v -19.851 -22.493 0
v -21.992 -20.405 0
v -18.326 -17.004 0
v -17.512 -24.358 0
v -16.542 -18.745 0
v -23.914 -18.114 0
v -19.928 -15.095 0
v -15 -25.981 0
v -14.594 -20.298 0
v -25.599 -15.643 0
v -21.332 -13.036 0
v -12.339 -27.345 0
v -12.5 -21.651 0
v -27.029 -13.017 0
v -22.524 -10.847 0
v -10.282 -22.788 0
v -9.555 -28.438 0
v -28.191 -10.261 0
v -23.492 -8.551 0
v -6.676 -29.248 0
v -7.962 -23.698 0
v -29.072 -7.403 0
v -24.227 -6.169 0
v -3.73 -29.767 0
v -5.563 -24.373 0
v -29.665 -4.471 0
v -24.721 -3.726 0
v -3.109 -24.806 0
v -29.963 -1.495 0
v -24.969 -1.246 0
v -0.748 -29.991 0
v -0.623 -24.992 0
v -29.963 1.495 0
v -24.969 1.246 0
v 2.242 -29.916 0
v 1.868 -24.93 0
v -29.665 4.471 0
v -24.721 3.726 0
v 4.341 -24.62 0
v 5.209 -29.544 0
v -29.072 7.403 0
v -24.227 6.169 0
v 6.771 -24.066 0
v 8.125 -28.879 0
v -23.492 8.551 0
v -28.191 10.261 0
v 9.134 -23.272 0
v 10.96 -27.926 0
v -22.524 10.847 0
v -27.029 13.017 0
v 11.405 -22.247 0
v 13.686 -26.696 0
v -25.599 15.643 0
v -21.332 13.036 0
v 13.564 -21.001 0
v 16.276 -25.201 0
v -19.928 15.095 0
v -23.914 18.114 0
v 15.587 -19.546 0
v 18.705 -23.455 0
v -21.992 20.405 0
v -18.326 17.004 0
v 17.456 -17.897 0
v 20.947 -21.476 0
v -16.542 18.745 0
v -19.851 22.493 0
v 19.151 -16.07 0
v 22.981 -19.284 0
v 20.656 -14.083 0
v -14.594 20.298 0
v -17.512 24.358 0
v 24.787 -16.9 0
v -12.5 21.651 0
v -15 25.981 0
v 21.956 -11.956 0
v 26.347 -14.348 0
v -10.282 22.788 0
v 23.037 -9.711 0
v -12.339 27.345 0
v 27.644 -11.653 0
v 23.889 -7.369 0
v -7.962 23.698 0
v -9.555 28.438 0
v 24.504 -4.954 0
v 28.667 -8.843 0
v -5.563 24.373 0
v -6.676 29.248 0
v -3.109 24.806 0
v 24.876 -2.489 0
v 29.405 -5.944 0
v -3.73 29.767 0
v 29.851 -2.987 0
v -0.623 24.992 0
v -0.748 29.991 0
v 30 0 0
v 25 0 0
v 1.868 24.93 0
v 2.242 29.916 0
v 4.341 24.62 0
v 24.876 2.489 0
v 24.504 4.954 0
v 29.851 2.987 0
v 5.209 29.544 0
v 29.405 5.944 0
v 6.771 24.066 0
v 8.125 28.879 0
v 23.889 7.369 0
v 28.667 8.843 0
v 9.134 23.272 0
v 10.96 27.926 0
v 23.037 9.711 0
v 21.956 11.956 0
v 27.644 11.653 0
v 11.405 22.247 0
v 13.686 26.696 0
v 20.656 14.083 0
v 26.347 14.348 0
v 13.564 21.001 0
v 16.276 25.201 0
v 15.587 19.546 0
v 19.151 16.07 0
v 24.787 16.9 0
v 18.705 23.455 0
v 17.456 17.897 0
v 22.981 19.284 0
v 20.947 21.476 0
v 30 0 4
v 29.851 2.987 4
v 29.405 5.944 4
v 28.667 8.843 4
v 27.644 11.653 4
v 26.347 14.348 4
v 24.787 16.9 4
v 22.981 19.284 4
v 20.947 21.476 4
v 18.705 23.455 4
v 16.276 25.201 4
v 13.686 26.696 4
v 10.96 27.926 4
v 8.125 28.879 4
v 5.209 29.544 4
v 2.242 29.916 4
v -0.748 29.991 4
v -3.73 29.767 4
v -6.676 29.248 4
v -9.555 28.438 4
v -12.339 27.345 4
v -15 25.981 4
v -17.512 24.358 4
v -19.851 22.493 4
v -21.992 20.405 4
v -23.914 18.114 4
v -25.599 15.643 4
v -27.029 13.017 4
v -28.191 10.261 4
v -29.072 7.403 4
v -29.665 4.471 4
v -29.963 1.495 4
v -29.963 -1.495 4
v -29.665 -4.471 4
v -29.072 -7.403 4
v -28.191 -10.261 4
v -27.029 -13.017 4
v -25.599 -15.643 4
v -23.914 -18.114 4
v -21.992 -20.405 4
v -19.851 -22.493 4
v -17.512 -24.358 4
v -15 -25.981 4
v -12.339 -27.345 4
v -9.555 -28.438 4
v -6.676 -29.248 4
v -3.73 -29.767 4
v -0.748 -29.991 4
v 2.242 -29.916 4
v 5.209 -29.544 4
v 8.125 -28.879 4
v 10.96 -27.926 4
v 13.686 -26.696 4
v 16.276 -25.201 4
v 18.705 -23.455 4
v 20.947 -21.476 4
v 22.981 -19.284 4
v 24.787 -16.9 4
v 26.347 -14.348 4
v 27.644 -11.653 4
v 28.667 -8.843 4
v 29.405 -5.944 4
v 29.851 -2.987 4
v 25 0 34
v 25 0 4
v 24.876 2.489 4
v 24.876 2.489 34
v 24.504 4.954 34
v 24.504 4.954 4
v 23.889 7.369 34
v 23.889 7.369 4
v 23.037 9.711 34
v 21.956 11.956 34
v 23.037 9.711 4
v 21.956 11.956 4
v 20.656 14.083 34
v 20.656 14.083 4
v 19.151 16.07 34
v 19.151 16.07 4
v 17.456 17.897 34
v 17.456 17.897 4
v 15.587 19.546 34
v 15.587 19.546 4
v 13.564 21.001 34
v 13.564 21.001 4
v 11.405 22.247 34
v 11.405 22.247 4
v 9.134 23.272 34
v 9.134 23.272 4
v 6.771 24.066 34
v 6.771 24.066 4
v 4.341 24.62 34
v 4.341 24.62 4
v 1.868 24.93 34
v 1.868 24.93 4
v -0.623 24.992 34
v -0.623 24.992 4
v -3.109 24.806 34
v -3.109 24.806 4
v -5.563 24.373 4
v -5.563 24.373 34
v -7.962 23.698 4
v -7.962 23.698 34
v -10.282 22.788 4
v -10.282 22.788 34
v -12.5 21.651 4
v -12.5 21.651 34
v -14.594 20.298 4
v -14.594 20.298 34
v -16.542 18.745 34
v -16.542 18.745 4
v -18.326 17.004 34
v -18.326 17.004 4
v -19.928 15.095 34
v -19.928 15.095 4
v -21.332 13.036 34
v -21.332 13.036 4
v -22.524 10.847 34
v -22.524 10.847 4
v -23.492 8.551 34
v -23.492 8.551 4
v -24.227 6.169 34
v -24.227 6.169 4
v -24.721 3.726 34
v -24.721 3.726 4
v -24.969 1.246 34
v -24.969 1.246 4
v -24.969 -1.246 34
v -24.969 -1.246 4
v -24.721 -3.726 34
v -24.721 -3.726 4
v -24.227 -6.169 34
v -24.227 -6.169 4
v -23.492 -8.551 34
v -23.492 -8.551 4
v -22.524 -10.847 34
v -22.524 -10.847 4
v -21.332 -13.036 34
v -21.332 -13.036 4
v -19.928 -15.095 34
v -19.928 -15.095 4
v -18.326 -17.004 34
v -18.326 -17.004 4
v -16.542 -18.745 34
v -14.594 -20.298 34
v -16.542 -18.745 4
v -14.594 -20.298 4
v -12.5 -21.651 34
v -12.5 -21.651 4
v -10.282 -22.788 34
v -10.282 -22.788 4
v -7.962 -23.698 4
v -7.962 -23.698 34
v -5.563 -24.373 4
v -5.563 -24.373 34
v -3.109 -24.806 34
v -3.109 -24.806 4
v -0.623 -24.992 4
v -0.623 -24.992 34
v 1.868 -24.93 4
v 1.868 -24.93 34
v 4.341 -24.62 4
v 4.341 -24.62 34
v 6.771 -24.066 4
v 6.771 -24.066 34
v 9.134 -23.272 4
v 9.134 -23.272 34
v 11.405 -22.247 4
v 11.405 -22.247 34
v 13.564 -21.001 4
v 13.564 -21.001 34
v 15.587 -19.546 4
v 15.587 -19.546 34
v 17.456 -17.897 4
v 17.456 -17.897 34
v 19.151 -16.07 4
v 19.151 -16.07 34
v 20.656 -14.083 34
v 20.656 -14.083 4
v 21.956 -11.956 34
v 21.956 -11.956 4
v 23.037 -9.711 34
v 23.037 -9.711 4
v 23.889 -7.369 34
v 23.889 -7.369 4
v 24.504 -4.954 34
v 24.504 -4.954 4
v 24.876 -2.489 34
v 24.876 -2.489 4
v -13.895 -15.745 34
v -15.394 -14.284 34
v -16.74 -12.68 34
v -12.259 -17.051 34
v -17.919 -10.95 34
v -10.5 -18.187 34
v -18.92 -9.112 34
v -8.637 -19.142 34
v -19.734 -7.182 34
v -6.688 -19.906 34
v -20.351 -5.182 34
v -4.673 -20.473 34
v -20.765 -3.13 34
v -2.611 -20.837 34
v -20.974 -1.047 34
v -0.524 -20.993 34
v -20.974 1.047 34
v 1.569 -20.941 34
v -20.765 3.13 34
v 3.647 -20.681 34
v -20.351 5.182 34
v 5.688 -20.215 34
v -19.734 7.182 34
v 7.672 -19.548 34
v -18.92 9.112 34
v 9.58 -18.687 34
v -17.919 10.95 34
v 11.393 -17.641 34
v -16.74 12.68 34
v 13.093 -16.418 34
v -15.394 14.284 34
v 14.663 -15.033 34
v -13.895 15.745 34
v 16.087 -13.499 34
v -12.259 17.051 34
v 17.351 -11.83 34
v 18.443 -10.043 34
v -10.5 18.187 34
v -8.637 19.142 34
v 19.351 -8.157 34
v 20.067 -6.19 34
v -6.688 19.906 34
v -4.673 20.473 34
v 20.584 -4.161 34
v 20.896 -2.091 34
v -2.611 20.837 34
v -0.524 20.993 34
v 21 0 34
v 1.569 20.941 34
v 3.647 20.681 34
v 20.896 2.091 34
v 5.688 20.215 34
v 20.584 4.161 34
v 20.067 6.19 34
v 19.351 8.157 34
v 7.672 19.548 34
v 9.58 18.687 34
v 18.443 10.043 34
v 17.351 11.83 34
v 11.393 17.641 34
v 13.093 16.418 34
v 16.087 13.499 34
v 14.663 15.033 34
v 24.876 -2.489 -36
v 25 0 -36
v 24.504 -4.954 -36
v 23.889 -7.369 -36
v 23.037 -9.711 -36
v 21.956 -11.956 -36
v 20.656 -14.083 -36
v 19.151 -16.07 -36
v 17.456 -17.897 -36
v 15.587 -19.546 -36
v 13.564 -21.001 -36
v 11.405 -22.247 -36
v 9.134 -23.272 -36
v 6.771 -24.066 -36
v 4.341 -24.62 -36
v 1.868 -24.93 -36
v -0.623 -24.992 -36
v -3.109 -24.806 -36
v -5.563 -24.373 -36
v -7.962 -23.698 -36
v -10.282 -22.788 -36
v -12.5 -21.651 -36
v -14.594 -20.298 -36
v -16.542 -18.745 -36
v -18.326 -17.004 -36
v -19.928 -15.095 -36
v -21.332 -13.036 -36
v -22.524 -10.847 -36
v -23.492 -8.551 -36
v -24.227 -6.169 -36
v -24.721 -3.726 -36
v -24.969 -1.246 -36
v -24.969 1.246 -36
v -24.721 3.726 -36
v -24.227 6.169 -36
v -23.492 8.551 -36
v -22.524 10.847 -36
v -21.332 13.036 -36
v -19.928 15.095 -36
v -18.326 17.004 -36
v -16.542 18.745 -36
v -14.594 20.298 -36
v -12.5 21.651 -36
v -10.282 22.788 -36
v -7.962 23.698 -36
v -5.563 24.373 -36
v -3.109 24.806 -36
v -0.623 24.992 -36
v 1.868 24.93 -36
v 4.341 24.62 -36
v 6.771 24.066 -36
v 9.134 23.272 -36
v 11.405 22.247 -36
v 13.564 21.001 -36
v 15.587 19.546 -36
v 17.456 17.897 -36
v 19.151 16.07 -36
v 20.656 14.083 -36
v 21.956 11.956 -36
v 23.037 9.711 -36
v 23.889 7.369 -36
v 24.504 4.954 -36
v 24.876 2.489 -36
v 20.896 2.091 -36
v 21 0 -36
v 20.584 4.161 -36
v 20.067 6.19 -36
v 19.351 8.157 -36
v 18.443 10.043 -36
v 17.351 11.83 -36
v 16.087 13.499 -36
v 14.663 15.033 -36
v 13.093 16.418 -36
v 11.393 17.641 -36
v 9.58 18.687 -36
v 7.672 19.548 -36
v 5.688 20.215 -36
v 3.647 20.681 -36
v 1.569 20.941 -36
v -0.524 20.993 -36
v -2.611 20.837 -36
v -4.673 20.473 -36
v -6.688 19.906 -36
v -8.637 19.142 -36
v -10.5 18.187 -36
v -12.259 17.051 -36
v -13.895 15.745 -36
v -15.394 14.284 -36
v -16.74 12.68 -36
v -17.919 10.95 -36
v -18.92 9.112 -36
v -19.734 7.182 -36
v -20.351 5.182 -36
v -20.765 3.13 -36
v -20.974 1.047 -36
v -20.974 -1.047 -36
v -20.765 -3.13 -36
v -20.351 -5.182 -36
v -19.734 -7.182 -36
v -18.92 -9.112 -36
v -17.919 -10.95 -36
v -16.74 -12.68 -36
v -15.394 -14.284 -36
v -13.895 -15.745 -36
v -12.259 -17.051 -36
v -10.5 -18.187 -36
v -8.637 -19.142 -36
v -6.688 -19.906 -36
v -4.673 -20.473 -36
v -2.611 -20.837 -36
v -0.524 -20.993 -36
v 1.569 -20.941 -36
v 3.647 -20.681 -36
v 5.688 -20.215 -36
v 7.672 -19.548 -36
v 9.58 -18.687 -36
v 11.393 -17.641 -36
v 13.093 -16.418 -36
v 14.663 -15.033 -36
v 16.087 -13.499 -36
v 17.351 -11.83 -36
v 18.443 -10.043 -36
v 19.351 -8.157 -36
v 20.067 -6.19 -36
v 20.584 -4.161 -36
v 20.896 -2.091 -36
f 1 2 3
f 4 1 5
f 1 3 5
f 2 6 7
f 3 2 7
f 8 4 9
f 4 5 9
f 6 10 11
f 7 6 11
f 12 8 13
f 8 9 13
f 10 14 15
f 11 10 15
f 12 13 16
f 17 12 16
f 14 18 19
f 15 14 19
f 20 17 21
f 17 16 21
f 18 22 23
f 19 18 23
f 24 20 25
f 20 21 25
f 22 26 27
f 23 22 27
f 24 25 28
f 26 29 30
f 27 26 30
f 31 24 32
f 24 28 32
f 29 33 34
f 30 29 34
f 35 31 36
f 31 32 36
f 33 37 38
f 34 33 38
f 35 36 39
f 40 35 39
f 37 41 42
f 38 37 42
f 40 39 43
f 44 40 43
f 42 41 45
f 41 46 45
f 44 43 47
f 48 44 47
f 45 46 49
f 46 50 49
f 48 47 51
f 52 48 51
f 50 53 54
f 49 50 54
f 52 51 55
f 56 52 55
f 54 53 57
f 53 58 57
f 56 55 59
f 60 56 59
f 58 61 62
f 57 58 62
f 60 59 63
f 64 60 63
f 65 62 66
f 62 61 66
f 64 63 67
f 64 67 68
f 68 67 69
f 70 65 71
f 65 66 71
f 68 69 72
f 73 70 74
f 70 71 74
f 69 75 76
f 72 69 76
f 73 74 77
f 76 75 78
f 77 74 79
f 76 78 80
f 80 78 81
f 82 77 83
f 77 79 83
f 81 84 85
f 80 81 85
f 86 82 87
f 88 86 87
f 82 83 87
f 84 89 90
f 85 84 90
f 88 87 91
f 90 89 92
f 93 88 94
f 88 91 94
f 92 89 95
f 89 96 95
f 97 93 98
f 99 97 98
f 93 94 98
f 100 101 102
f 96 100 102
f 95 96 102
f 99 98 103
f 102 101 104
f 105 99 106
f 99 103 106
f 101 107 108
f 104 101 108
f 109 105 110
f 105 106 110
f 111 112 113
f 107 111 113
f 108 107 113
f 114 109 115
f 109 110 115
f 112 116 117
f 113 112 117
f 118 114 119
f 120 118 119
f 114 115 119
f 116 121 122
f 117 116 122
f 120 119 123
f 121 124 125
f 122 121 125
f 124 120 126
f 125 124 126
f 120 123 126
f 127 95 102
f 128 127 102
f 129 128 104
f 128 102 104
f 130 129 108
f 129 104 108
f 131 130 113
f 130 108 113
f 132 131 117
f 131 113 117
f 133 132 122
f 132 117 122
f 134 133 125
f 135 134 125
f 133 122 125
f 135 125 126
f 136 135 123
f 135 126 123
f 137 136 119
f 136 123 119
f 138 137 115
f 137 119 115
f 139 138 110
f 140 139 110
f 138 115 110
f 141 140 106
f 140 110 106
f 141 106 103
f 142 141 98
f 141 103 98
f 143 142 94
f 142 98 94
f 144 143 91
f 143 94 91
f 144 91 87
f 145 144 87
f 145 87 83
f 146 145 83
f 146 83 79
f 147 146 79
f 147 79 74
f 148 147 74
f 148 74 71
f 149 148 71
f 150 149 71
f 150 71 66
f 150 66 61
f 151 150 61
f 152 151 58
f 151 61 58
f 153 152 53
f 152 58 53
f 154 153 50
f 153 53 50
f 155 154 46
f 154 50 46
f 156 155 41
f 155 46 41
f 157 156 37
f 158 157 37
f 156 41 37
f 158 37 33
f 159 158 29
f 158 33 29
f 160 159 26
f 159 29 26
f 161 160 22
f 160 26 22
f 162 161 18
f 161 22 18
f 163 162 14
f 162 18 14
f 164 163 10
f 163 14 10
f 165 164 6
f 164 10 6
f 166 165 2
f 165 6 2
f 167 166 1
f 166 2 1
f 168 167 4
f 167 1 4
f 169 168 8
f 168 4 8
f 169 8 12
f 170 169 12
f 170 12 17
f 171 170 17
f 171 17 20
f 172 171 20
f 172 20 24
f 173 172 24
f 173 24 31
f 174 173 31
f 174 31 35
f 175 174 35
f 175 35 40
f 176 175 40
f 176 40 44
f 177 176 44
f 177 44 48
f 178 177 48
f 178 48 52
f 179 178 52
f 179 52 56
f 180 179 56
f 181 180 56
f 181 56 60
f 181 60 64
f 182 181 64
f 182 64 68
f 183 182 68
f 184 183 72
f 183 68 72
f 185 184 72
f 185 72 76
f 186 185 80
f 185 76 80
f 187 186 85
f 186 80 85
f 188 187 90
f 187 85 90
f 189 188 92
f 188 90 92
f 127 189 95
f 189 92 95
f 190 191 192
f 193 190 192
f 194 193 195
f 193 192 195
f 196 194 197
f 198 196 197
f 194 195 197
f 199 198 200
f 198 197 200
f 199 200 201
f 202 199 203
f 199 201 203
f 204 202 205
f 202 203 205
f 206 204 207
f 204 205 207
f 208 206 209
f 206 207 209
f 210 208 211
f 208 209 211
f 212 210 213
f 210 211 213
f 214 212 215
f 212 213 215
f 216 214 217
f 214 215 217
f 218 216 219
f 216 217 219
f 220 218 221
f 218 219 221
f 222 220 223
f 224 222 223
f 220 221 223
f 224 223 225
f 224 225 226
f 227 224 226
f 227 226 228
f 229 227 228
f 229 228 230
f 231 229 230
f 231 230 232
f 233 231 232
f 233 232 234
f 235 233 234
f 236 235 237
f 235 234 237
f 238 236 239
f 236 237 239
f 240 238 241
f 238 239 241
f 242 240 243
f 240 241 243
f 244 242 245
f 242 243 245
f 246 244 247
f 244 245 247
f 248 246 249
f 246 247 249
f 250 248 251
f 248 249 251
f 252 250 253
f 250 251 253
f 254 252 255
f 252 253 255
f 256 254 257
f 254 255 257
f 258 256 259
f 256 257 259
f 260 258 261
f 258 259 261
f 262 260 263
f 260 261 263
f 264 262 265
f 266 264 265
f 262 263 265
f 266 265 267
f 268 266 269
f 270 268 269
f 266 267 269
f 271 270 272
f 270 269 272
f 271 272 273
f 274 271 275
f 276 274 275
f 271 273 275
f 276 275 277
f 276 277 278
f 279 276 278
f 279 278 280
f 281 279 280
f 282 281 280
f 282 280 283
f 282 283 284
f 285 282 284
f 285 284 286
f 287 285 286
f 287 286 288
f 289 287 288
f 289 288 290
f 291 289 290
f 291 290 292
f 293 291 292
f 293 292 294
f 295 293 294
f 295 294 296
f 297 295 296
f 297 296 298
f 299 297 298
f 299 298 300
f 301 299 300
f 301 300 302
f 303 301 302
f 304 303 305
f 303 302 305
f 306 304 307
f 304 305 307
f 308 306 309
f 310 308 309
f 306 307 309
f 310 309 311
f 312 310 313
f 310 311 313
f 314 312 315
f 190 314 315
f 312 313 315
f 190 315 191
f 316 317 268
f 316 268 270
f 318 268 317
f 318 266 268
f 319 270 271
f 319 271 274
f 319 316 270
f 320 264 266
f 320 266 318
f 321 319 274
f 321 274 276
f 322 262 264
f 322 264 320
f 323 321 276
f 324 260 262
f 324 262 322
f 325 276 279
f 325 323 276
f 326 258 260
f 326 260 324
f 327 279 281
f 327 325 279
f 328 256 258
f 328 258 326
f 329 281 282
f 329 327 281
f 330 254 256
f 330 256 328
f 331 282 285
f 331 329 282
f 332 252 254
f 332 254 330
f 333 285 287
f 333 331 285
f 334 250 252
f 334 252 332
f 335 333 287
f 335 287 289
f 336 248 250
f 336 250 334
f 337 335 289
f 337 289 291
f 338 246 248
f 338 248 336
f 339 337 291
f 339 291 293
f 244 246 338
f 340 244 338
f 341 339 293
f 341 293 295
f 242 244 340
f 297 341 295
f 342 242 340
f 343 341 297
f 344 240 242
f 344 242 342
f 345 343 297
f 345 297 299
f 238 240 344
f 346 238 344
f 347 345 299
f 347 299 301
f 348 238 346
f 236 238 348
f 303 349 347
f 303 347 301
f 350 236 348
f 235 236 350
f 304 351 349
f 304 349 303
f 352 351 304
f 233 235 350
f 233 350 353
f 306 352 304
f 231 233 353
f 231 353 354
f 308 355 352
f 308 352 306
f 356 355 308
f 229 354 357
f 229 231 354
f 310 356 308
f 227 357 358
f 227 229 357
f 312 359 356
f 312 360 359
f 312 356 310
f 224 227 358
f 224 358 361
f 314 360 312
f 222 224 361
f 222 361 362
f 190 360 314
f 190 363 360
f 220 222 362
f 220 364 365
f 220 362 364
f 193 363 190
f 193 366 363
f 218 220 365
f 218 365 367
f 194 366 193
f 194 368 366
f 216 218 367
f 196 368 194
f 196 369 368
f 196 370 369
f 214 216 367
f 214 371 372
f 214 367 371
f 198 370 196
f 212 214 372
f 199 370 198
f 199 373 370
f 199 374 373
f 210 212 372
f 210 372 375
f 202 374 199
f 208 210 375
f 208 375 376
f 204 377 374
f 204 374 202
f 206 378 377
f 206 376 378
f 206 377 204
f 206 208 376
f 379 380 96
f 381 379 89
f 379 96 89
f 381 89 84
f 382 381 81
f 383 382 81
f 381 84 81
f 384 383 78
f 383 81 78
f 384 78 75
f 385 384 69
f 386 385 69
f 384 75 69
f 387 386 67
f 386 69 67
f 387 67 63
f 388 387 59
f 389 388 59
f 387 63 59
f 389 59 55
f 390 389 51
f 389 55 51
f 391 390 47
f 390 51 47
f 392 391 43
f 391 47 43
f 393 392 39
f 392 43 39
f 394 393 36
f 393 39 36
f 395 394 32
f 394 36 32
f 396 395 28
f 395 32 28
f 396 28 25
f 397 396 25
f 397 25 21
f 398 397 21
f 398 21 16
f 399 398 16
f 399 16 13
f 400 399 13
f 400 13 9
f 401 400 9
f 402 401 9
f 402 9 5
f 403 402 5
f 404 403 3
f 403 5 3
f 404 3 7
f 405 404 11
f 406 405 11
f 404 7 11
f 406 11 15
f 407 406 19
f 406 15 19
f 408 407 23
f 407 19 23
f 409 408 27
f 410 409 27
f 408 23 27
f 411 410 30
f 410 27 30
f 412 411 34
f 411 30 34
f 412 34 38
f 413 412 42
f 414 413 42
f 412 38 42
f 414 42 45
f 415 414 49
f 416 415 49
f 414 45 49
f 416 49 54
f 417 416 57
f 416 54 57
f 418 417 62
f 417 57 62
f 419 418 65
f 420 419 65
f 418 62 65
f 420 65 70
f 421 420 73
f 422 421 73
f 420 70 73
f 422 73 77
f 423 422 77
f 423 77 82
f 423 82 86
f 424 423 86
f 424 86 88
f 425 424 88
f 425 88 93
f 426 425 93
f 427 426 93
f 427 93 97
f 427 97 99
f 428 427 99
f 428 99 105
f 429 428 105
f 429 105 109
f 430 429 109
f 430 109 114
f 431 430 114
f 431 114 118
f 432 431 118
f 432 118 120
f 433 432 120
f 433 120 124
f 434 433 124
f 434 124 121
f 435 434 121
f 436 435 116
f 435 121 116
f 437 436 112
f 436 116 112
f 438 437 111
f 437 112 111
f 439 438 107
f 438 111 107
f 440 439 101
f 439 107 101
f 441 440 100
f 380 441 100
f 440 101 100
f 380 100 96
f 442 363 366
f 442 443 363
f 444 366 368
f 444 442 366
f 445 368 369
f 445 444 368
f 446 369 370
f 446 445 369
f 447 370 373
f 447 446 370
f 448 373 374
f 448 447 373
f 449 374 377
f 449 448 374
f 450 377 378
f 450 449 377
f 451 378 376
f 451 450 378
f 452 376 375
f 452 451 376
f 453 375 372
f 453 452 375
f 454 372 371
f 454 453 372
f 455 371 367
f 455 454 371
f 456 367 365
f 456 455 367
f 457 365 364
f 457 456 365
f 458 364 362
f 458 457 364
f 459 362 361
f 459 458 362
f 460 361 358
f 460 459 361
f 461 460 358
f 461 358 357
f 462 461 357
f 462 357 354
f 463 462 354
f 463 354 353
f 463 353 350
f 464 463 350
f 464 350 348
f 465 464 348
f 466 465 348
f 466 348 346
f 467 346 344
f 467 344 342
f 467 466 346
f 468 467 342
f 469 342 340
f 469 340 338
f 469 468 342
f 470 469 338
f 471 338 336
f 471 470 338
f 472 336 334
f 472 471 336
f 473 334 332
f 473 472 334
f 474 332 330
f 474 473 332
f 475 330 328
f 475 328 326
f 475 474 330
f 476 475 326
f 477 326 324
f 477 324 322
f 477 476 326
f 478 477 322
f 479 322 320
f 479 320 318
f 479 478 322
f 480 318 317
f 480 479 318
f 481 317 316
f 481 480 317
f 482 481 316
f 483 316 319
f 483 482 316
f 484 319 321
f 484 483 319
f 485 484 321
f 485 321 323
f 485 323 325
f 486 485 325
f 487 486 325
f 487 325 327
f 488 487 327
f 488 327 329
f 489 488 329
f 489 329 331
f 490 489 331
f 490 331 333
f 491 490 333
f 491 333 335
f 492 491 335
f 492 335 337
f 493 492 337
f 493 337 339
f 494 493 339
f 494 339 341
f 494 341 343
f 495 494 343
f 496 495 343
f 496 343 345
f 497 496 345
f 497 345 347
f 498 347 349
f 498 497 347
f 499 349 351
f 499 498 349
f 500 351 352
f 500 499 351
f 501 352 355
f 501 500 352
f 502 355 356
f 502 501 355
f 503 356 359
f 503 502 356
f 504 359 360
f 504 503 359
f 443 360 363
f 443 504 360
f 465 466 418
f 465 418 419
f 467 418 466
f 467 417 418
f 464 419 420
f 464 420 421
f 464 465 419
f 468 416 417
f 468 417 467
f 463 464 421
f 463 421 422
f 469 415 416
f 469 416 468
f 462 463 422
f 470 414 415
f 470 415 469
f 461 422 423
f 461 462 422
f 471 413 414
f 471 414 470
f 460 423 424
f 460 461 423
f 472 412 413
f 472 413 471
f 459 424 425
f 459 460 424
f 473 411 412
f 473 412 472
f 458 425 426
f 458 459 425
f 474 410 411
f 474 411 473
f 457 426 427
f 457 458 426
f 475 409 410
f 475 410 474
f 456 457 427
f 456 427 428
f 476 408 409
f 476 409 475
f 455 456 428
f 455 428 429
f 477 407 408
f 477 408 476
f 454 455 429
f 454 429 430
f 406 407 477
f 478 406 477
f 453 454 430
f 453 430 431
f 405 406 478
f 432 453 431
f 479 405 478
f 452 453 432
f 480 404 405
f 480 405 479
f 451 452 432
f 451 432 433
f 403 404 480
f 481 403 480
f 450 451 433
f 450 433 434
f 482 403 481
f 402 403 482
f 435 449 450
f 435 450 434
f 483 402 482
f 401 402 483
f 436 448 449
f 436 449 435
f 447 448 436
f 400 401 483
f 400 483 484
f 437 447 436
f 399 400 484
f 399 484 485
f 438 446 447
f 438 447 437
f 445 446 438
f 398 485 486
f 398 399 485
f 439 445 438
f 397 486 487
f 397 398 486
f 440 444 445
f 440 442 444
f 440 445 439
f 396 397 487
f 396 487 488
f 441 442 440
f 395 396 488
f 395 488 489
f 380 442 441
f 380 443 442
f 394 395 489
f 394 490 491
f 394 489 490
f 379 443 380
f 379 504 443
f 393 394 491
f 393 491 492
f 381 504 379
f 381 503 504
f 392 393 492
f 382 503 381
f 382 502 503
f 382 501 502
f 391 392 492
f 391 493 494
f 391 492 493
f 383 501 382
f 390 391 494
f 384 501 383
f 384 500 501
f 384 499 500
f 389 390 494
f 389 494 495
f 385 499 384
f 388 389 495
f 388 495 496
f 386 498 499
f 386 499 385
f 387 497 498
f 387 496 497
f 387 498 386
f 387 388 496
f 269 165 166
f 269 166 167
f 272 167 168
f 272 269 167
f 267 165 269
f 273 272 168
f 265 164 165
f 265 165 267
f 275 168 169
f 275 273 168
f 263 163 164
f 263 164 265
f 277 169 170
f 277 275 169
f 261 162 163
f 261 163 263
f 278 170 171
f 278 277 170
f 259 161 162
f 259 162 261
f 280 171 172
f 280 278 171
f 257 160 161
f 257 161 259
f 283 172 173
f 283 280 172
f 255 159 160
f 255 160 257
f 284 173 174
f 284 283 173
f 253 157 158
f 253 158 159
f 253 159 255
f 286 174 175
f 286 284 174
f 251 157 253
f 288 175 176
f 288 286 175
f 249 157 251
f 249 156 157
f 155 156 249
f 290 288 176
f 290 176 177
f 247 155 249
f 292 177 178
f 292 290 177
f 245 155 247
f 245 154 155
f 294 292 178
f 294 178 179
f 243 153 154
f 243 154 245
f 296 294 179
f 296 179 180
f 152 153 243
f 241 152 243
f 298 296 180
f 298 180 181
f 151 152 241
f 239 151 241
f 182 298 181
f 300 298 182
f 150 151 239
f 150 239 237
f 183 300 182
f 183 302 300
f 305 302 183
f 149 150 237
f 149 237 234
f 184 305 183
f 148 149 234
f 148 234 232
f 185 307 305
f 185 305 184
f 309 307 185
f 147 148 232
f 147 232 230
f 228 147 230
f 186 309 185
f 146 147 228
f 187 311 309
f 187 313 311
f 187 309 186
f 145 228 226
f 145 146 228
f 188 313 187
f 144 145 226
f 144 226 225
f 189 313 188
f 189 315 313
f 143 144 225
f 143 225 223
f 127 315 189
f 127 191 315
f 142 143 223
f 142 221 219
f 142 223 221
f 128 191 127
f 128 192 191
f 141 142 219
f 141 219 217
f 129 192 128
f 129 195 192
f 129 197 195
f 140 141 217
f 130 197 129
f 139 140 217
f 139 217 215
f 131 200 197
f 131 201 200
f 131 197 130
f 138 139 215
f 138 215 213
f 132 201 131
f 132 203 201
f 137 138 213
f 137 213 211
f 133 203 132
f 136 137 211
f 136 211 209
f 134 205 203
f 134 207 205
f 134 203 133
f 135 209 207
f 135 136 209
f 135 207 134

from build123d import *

# Parameters (mm, degrees)
SKETCH_R      = 30
SKETCH_R_2    = 21
PAD_DEPTH     = 4
SKETCH001_R   = 25
SKETCH001_R_2 = 21
PAD001_DEPTH  = 36
SKETCH002_R   = 25
SKETCH002_R_2 = 21
PAD002_DEPTH  = 30


with BuildPart() as part:
    # Sketch → Pad (new body)
    with BuildSketch(Plane.XY):
        Circle(SKETCH_R)
        Circle(SKETCH_R_2, mode=Mode.SUBTRACT)
    extrude(amount=PAD_DEPTH)

    # Sketch001 (on Face3 of Pad) → Pad001 (join)
    with BuildSketch(Plane(origin=(0, 0, 0), x_dir=(1, 0, 0), z_dir=(0, 0, -1))):
        Circle(SKETCH001_R)
        Circle(SKETCH001_R_2, mode=Mode.SUBTRACT)
    extrude(amount=PAD001_DEPTH)

    # Sketch002 (on Face3 of Pad001) → Pad002 (join)
    with BuildSketch(Plane.XY.offset(4)):
        Circle(SKETCH002_R)
        Circle(SKETCH002_R_2, mode=Mode.SUBTRACT)
    extrude(amount=PAD002_DEPTH)


solid = part.part
